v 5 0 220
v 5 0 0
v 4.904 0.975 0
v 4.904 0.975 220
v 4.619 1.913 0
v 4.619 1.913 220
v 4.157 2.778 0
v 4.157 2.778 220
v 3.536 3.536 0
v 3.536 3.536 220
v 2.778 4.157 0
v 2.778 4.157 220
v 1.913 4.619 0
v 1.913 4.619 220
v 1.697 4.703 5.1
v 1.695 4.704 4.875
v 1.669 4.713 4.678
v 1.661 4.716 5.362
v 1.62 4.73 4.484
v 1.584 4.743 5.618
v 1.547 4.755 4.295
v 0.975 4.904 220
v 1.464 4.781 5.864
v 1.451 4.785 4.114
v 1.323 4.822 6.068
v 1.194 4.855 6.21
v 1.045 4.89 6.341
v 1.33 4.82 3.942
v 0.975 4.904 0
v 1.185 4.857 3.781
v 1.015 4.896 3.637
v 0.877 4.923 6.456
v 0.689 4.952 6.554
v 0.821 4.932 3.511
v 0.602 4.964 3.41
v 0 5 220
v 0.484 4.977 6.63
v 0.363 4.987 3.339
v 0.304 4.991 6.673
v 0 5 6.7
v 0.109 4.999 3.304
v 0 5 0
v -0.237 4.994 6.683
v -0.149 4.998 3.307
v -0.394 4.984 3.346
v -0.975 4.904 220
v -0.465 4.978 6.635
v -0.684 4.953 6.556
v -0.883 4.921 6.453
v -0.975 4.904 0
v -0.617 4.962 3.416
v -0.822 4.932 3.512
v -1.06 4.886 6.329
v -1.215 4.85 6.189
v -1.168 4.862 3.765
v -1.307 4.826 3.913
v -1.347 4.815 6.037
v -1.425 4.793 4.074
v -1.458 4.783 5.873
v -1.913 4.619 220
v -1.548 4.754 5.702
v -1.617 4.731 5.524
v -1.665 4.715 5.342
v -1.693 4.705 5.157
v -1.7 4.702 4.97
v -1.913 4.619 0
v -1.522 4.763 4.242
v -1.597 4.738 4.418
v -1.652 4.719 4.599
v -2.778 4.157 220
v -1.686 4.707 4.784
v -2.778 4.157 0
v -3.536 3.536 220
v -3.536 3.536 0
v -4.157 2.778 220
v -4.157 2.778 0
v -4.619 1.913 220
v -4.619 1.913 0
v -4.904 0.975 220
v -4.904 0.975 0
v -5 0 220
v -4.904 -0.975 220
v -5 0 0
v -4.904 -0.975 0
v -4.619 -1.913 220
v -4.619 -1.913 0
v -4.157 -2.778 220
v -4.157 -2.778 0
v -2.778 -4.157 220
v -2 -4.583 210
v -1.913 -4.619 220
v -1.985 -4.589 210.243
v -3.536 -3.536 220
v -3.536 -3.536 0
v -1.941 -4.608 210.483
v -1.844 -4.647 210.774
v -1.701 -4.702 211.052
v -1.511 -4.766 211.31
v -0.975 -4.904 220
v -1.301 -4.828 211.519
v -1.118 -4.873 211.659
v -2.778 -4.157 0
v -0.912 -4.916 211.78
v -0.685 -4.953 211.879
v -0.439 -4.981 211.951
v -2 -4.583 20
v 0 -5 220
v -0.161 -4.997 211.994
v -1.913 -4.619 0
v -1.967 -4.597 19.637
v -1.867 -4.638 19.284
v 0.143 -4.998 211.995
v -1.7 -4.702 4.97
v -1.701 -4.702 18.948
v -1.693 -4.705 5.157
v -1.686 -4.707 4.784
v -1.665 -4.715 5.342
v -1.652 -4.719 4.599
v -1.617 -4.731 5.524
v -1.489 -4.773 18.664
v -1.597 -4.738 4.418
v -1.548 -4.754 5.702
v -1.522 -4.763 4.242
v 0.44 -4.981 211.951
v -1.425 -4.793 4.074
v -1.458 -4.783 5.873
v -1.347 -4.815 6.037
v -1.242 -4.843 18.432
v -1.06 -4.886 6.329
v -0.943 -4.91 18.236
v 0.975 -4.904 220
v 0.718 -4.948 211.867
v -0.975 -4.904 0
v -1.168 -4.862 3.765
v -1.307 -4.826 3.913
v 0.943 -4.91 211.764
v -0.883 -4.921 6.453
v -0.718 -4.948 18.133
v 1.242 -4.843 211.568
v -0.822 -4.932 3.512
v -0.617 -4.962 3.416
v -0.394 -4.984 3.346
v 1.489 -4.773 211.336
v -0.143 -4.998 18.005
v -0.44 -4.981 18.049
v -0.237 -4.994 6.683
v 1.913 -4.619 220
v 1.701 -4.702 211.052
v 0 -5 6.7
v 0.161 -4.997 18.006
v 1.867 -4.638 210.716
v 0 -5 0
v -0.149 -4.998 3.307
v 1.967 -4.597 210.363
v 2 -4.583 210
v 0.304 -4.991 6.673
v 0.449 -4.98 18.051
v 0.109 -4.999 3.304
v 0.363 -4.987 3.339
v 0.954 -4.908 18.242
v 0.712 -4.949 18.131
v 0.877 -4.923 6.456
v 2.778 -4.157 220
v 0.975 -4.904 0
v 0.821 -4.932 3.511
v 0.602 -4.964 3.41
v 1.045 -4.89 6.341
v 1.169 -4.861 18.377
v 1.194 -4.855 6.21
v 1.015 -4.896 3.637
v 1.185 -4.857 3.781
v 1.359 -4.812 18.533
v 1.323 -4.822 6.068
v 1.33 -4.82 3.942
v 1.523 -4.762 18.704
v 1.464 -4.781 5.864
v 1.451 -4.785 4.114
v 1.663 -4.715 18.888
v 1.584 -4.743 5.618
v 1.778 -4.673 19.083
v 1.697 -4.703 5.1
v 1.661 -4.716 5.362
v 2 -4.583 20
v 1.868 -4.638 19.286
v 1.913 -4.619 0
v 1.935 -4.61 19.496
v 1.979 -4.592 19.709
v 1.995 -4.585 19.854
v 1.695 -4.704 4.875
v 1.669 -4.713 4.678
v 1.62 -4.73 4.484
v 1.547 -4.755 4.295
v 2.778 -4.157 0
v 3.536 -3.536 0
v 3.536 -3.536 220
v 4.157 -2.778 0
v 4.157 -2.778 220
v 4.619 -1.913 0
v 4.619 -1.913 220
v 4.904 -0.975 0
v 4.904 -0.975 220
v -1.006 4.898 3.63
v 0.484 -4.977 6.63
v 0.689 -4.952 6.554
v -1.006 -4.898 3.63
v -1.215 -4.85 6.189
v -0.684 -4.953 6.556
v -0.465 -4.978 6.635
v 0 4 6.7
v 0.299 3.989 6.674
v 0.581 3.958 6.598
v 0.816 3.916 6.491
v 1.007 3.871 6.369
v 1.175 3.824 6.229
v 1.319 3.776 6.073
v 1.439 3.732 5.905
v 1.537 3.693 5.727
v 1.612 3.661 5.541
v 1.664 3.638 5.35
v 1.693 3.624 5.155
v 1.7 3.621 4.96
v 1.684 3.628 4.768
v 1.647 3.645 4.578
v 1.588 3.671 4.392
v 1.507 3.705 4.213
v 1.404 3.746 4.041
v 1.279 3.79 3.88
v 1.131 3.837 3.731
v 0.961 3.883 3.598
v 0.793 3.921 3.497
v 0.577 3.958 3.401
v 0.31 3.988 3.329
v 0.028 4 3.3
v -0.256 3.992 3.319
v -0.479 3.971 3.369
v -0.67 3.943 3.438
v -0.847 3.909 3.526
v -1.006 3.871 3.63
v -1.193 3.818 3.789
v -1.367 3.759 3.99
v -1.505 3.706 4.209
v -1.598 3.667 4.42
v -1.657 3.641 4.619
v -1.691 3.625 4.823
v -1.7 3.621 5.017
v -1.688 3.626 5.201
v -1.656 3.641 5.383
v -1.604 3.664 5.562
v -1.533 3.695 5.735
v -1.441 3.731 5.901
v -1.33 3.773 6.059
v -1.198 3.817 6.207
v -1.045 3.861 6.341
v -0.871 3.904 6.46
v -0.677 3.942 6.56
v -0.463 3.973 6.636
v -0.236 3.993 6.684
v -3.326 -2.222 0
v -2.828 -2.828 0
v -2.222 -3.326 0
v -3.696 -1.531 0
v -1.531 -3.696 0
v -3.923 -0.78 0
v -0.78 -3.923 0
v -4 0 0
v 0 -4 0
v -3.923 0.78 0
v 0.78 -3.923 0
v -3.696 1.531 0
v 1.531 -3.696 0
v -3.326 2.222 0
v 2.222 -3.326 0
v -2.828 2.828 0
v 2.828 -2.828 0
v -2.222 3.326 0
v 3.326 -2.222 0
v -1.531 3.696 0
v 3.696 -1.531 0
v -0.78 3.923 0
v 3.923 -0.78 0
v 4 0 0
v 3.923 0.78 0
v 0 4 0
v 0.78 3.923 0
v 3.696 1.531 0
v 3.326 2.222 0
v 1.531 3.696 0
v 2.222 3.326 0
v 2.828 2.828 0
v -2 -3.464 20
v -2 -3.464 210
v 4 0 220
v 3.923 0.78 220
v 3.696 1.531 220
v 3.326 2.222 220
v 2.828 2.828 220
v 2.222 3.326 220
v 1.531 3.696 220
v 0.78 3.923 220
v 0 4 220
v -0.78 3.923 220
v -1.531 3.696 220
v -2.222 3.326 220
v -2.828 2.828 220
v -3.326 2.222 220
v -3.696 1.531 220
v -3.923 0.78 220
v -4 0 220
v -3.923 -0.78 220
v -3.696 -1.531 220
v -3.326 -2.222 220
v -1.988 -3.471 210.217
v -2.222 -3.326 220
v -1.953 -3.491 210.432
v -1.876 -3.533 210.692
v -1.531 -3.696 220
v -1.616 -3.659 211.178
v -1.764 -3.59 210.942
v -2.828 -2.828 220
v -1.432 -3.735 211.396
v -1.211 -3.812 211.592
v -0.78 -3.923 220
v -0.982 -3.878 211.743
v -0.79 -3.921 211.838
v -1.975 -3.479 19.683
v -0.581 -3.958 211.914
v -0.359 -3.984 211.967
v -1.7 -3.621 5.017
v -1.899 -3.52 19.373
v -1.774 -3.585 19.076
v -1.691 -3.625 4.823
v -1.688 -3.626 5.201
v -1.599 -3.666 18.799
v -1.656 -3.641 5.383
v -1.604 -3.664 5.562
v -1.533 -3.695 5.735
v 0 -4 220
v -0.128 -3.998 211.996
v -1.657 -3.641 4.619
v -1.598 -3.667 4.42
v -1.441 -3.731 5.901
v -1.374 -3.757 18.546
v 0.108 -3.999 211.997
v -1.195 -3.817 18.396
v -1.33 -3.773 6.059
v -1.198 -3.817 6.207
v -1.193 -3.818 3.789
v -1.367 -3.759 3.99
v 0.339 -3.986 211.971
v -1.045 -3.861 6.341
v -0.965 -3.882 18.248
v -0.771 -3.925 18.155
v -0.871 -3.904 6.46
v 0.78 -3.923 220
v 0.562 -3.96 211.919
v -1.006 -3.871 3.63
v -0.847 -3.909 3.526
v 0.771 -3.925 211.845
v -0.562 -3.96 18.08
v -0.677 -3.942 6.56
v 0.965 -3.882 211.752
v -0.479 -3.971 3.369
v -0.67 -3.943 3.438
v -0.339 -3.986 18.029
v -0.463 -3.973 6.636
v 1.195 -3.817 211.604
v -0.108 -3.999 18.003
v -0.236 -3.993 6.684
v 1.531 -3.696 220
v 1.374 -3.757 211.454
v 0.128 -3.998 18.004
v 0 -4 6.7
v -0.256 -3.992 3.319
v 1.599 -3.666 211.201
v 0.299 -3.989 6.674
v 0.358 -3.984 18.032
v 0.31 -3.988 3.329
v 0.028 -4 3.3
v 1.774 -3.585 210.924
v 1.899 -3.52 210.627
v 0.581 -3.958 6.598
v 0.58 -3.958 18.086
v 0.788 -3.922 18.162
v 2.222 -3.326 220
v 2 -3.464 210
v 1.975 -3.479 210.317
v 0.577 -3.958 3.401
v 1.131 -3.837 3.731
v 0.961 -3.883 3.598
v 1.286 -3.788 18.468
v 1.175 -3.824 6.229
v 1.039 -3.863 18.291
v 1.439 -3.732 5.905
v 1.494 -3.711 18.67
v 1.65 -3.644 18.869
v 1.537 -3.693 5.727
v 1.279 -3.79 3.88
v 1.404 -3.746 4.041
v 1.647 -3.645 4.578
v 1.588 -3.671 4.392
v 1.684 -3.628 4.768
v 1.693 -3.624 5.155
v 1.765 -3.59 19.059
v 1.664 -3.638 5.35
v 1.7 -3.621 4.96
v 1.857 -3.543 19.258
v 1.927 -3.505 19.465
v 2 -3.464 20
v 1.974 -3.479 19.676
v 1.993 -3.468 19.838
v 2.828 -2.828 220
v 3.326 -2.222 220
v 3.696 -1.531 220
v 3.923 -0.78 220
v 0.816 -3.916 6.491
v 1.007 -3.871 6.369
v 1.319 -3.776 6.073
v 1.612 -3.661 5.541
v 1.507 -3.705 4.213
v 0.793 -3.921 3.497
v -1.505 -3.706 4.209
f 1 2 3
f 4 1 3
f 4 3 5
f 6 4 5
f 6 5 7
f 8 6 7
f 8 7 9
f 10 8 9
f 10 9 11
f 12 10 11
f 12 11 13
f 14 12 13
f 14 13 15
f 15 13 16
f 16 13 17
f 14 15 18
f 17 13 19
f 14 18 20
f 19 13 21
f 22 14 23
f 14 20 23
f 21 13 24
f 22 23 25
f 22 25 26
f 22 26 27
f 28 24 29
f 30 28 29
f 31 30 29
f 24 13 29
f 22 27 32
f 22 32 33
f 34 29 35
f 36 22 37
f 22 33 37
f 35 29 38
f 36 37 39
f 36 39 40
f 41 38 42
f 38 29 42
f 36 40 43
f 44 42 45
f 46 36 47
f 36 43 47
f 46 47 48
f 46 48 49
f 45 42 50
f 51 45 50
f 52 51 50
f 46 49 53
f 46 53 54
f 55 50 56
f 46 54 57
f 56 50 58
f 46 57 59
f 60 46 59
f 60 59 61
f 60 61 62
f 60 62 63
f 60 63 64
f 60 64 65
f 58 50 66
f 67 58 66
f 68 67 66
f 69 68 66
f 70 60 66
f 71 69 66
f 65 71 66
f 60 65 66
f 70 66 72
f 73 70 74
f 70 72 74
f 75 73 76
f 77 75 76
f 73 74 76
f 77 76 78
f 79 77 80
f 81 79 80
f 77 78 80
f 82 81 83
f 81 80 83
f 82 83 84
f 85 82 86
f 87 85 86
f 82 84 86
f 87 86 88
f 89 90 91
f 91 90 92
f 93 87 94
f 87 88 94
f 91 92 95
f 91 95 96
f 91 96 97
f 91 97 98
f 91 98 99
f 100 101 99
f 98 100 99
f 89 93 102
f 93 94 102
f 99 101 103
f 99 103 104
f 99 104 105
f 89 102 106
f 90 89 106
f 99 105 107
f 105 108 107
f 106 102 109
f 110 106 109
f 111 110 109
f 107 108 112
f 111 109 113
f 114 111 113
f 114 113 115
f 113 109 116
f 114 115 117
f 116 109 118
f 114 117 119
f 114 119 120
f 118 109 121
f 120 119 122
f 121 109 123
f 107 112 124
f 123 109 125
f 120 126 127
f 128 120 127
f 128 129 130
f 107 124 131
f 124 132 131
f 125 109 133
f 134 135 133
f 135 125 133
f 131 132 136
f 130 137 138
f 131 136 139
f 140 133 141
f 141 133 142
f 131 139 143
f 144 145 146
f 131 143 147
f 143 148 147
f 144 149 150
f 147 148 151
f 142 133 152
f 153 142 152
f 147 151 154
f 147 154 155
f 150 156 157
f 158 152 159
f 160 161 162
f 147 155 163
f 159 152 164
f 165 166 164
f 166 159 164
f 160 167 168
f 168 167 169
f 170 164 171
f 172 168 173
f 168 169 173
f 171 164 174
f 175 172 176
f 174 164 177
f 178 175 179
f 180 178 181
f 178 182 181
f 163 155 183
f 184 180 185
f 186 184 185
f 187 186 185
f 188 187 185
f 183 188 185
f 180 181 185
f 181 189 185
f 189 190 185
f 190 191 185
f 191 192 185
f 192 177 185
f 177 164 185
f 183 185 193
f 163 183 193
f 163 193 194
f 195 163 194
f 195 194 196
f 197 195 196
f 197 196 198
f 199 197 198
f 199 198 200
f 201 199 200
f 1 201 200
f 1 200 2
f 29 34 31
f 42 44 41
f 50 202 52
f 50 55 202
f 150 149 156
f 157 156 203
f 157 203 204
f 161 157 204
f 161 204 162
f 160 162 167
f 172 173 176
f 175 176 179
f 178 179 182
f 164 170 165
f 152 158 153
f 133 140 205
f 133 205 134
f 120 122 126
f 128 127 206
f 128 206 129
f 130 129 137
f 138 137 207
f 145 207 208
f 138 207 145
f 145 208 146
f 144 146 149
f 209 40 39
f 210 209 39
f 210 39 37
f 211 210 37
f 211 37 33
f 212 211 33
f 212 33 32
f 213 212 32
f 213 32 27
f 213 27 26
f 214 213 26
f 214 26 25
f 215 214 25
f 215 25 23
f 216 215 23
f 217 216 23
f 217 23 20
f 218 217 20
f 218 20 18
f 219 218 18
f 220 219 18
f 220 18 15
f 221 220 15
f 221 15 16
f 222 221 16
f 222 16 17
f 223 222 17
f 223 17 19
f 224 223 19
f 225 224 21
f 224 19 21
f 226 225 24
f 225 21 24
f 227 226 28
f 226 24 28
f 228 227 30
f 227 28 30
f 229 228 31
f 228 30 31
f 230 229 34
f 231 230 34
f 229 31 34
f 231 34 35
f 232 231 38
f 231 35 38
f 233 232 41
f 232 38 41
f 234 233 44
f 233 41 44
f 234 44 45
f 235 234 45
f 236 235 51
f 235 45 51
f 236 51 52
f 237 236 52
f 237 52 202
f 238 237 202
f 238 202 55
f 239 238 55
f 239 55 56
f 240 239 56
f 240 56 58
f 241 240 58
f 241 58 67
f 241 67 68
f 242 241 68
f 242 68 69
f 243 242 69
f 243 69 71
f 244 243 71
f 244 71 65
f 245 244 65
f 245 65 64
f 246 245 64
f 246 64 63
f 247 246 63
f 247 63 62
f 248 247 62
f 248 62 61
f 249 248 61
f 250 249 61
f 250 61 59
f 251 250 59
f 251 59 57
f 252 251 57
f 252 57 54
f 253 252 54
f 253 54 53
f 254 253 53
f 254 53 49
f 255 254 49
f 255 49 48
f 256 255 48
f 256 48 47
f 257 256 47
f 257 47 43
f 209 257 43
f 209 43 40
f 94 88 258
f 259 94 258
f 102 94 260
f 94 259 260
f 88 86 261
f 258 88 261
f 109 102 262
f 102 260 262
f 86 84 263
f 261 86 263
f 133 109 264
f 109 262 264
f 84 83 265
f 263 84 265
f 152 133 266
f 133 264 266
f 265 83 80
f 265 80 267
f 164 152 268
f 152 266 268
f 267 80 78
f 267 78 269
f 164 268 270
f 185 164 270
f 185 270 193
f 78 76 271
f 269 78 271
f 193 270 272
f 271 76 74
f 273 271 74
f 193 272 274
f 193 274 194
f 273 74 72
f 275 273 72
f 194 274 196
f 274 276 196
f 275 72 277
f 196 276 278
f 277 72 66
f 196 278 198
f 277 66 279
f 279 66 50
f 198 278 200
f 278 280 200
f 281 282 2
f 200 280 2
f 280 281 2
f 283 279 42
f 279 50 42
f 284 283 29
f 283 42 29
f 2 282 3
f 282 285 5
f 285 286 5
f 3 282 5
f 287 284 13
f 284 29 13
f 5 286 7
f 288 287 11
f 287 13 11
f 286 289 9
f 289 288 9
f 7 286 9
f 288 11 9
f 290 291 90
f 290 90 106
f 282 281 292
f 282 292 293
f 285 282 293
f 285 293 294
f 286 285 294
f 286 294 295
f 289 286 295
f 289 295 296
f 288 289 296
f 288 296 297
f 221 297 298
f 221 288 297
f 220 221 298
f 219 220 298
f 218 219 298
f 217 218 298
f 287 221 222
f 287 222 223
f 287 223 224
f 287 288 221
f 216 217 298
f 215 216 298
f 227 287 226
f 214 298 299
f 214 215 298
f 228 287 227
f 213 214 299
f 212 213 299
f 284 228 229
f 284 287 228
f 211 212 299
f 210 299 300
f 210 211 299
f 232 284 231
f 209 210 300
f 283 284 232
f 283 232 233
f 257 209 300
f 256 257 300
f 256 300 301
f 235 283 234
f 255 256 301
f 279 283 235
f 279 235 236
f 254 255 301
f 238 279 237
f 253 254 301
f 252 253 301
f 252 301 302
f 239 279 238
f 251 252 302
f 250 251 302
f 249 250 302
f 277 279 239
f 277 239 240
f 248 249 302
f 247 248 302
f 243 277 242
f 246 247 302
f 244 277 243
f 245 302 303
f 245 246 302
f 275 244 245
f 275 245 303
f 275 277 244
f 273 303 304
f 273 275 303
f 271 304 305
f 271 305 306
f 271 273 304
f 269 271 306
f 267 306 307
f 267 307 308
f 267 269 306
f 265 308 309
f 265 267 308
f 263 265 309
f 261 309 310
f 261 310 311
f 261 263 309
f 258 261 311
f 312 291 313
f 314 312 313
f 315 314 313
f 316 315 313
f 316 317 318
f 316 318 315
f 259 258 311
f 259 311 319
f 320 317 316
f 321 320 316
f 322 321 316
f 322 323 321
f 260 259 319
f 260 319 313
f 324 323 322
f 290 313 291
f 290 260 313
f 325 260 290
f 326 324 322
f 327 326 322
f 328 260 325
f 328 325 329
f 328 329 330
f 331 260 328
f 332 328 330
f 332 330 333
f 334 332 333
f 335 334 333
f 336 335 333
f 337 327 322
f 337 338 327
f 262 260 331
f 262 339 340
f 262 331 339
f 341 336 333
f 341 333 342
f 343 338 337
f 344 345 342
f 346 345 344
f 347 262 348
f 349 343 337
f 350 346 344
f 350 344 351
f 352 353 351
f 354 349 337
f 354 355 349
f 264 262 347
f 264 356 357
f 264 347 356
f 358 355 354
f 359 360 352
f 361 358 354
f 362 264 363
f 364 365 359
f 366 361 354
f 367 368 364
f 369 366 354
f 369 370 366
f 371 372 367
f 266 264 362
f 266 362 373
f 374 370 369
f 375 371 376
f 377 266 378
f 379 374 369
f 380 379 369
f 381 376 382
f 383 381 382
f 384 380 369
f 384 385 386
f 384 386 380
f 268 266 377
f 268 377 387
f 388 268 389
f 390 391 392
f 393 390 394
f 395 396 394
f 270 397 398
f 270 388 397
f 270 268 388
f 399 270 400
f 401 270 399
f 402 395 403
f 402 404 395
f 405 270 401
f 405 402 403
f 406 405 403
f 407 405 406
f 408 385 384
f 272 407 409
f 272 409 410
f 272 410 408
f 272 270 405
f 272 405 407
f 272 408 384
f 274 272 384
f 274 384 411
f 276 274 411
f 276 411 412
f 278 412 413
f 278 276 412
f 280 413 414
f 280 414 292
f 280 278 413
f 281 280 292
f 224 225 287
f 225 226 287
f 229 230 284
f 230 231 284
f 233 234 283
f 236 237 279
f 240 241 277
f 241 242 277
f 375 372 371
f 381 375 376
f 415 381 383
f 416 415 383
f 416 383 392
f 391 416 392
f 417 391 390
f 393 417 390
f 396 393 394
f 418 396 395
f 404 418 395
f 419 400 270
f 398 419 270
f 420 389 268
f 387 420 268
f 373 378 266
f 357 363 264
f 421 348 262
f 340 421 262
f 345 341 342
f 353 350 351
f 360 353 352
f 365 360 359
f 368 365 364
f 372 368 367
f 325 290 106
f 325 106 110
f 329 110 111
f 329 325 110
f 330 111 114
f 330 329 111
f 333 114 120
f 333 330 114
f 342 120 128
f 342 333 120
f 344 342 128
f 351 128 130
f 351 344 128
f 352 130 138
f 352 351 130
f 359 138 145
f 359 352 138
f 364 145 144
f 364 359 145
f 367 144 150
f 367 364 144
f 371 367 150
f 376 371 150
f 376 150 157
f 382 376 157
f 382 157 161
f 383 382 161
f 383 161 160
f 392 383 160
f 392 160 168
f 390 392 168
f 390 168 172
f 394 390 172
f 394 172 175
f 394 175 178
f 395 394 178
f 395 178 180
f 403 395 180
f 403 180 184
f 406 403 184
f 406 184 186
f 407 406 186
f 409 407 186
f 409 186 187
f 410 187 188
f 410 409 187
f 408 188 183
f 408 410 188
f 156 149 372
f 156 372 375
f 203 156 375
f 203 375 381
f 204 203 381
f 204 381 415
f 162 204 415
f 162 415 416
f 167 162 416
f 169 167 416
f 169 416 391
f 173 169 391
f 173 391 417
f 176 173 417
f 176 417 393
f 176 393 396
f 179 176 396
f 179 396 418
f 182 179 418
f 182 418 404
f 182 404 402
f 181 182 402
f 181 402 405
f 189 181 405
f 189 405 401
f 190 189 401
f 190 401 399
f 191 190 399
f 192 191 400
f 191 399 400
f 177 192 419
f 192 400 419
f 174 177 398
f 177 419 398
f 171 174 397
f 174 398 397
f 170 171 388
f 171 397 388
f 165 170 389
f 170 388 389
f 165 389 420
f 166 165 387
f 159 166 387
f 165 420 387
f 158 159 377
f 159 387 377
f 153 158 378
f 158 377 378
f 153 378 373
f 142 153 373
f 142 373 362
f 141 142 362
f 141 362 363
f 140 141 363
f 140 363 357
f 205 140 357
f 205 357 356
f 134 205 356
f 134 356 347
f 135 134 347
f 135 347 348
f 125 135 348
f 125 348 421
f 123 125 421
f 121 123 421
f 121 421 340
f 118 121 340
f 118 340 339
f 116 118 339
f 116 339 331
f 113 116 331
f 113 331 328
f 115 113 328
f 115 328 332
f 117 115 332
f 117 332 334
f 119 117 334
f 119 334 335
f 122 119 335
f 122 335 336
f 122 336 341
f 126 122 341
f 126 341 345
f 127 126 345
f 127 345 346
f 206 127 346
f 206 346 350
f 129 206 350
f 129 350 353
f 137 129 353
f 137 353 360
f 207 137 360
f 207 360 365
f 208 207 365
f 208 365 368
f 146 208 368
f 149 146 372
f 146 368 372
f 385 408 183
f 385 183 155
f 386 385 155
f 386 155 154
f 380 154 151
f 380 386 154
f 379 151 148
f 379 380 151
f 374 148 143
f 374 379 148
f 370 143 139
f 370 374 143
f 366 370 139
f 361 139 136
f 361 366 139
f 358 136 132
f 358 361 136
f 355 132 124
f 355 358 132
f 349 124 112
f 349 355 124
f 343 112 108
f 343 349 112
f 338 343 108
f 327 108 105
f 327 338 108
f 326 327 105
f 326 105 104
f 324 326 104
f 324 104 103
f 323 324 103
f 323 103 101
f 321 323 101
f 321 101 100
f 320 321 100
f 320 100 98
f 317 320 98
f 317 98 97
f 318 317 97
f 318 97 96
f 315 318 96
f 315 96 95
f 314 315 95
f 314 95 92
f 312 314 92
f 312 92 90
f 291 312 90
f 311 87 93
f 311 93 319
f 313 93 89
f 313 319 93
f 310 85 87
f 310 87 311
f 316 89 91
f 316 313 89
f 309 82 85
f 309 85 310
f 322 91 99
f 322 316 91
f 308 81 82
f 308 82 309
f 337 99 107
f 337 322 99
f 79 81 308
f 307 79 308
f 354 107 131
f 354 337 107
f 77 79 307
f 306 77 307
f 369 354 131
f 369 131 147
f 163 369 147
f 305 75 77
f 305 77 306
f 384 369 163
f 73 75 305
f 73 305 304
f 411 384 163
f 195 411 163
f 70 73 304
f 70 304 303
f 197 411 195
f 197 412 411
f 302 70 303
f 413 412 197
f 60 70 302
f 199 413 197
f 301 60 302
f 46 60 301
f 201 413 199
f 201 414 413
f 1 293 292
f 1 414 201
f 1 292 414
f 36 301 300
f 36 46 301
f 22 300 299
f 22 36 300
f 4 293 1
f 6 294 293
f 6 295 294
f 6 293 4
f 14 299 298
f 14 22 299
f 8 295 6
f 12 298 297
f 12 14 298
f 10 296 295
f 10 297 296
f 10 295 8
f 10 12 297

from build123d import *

# Parameters (mm, degrees)
SKETCH_1_R          = 5
SKETCH_1_R_2        = 4
EXTRUDE_1_DEPTH     = 220
SKETCH_2_R          = 1.7
CUT_EXTRUDE_1_DEPTH = 10
CUT_EXTRUDE_START   = 16
SKETCH_3_R          = 1.7
CUT_EXTRUDE_3_DEPTH = 16


with BuildPart() as part:
    # 草图1 → 拉伸1 (new body)
    with BuildSketch(Plane.XY):
        Circle(SKETCH_1_R)
        Circle(SKETCH_1_R_2, mode=Mode.SUBTRACT)
    extrude(amount=EXTRUDE_1_DEPTH)

    # 草图2 → 切除-拉伸1 (cut)
    with BuildSketch(Plane(origin=(0, 0, 0), x_dir=(1, 0, 0), z_dir=(0, 1, 0))):
        with Locations(Location((0, -5, 0), (0, 0, 270))):
            Circle(SKETCH_2_R)
        with BuildLine():
            Line((-2, -210), (-2, -20))
            ThreePointArc((-2, -20), (0, -18), (2, -20))
            Line((2, -20), (2, -210))
            ThreePointArc((2, -210), (0, -212), (-2, -210))
        make_face()
    extrude(amount=-CUT_EXTRUDE_1_DEPTH, mode=Mode.SUBTRACT)

    # 草图3 → 切除-拉伸3 (cut)
    with BuildSketch(Plane(origin=(0, 0, 0), x_dir=(1, 0, 0), z_dir=(0, 1, 0)).offset(CUT_EXTRUDE_START)):
        with Locations(Location((0, -5, 0), (0, 0, 270))):
            Circle(SKETCH_3_R)
    extrude(amount=-CUT_EXTRUDE_3_DEPTH, mode=Mode.SUBTRACT)


solid = part.part
